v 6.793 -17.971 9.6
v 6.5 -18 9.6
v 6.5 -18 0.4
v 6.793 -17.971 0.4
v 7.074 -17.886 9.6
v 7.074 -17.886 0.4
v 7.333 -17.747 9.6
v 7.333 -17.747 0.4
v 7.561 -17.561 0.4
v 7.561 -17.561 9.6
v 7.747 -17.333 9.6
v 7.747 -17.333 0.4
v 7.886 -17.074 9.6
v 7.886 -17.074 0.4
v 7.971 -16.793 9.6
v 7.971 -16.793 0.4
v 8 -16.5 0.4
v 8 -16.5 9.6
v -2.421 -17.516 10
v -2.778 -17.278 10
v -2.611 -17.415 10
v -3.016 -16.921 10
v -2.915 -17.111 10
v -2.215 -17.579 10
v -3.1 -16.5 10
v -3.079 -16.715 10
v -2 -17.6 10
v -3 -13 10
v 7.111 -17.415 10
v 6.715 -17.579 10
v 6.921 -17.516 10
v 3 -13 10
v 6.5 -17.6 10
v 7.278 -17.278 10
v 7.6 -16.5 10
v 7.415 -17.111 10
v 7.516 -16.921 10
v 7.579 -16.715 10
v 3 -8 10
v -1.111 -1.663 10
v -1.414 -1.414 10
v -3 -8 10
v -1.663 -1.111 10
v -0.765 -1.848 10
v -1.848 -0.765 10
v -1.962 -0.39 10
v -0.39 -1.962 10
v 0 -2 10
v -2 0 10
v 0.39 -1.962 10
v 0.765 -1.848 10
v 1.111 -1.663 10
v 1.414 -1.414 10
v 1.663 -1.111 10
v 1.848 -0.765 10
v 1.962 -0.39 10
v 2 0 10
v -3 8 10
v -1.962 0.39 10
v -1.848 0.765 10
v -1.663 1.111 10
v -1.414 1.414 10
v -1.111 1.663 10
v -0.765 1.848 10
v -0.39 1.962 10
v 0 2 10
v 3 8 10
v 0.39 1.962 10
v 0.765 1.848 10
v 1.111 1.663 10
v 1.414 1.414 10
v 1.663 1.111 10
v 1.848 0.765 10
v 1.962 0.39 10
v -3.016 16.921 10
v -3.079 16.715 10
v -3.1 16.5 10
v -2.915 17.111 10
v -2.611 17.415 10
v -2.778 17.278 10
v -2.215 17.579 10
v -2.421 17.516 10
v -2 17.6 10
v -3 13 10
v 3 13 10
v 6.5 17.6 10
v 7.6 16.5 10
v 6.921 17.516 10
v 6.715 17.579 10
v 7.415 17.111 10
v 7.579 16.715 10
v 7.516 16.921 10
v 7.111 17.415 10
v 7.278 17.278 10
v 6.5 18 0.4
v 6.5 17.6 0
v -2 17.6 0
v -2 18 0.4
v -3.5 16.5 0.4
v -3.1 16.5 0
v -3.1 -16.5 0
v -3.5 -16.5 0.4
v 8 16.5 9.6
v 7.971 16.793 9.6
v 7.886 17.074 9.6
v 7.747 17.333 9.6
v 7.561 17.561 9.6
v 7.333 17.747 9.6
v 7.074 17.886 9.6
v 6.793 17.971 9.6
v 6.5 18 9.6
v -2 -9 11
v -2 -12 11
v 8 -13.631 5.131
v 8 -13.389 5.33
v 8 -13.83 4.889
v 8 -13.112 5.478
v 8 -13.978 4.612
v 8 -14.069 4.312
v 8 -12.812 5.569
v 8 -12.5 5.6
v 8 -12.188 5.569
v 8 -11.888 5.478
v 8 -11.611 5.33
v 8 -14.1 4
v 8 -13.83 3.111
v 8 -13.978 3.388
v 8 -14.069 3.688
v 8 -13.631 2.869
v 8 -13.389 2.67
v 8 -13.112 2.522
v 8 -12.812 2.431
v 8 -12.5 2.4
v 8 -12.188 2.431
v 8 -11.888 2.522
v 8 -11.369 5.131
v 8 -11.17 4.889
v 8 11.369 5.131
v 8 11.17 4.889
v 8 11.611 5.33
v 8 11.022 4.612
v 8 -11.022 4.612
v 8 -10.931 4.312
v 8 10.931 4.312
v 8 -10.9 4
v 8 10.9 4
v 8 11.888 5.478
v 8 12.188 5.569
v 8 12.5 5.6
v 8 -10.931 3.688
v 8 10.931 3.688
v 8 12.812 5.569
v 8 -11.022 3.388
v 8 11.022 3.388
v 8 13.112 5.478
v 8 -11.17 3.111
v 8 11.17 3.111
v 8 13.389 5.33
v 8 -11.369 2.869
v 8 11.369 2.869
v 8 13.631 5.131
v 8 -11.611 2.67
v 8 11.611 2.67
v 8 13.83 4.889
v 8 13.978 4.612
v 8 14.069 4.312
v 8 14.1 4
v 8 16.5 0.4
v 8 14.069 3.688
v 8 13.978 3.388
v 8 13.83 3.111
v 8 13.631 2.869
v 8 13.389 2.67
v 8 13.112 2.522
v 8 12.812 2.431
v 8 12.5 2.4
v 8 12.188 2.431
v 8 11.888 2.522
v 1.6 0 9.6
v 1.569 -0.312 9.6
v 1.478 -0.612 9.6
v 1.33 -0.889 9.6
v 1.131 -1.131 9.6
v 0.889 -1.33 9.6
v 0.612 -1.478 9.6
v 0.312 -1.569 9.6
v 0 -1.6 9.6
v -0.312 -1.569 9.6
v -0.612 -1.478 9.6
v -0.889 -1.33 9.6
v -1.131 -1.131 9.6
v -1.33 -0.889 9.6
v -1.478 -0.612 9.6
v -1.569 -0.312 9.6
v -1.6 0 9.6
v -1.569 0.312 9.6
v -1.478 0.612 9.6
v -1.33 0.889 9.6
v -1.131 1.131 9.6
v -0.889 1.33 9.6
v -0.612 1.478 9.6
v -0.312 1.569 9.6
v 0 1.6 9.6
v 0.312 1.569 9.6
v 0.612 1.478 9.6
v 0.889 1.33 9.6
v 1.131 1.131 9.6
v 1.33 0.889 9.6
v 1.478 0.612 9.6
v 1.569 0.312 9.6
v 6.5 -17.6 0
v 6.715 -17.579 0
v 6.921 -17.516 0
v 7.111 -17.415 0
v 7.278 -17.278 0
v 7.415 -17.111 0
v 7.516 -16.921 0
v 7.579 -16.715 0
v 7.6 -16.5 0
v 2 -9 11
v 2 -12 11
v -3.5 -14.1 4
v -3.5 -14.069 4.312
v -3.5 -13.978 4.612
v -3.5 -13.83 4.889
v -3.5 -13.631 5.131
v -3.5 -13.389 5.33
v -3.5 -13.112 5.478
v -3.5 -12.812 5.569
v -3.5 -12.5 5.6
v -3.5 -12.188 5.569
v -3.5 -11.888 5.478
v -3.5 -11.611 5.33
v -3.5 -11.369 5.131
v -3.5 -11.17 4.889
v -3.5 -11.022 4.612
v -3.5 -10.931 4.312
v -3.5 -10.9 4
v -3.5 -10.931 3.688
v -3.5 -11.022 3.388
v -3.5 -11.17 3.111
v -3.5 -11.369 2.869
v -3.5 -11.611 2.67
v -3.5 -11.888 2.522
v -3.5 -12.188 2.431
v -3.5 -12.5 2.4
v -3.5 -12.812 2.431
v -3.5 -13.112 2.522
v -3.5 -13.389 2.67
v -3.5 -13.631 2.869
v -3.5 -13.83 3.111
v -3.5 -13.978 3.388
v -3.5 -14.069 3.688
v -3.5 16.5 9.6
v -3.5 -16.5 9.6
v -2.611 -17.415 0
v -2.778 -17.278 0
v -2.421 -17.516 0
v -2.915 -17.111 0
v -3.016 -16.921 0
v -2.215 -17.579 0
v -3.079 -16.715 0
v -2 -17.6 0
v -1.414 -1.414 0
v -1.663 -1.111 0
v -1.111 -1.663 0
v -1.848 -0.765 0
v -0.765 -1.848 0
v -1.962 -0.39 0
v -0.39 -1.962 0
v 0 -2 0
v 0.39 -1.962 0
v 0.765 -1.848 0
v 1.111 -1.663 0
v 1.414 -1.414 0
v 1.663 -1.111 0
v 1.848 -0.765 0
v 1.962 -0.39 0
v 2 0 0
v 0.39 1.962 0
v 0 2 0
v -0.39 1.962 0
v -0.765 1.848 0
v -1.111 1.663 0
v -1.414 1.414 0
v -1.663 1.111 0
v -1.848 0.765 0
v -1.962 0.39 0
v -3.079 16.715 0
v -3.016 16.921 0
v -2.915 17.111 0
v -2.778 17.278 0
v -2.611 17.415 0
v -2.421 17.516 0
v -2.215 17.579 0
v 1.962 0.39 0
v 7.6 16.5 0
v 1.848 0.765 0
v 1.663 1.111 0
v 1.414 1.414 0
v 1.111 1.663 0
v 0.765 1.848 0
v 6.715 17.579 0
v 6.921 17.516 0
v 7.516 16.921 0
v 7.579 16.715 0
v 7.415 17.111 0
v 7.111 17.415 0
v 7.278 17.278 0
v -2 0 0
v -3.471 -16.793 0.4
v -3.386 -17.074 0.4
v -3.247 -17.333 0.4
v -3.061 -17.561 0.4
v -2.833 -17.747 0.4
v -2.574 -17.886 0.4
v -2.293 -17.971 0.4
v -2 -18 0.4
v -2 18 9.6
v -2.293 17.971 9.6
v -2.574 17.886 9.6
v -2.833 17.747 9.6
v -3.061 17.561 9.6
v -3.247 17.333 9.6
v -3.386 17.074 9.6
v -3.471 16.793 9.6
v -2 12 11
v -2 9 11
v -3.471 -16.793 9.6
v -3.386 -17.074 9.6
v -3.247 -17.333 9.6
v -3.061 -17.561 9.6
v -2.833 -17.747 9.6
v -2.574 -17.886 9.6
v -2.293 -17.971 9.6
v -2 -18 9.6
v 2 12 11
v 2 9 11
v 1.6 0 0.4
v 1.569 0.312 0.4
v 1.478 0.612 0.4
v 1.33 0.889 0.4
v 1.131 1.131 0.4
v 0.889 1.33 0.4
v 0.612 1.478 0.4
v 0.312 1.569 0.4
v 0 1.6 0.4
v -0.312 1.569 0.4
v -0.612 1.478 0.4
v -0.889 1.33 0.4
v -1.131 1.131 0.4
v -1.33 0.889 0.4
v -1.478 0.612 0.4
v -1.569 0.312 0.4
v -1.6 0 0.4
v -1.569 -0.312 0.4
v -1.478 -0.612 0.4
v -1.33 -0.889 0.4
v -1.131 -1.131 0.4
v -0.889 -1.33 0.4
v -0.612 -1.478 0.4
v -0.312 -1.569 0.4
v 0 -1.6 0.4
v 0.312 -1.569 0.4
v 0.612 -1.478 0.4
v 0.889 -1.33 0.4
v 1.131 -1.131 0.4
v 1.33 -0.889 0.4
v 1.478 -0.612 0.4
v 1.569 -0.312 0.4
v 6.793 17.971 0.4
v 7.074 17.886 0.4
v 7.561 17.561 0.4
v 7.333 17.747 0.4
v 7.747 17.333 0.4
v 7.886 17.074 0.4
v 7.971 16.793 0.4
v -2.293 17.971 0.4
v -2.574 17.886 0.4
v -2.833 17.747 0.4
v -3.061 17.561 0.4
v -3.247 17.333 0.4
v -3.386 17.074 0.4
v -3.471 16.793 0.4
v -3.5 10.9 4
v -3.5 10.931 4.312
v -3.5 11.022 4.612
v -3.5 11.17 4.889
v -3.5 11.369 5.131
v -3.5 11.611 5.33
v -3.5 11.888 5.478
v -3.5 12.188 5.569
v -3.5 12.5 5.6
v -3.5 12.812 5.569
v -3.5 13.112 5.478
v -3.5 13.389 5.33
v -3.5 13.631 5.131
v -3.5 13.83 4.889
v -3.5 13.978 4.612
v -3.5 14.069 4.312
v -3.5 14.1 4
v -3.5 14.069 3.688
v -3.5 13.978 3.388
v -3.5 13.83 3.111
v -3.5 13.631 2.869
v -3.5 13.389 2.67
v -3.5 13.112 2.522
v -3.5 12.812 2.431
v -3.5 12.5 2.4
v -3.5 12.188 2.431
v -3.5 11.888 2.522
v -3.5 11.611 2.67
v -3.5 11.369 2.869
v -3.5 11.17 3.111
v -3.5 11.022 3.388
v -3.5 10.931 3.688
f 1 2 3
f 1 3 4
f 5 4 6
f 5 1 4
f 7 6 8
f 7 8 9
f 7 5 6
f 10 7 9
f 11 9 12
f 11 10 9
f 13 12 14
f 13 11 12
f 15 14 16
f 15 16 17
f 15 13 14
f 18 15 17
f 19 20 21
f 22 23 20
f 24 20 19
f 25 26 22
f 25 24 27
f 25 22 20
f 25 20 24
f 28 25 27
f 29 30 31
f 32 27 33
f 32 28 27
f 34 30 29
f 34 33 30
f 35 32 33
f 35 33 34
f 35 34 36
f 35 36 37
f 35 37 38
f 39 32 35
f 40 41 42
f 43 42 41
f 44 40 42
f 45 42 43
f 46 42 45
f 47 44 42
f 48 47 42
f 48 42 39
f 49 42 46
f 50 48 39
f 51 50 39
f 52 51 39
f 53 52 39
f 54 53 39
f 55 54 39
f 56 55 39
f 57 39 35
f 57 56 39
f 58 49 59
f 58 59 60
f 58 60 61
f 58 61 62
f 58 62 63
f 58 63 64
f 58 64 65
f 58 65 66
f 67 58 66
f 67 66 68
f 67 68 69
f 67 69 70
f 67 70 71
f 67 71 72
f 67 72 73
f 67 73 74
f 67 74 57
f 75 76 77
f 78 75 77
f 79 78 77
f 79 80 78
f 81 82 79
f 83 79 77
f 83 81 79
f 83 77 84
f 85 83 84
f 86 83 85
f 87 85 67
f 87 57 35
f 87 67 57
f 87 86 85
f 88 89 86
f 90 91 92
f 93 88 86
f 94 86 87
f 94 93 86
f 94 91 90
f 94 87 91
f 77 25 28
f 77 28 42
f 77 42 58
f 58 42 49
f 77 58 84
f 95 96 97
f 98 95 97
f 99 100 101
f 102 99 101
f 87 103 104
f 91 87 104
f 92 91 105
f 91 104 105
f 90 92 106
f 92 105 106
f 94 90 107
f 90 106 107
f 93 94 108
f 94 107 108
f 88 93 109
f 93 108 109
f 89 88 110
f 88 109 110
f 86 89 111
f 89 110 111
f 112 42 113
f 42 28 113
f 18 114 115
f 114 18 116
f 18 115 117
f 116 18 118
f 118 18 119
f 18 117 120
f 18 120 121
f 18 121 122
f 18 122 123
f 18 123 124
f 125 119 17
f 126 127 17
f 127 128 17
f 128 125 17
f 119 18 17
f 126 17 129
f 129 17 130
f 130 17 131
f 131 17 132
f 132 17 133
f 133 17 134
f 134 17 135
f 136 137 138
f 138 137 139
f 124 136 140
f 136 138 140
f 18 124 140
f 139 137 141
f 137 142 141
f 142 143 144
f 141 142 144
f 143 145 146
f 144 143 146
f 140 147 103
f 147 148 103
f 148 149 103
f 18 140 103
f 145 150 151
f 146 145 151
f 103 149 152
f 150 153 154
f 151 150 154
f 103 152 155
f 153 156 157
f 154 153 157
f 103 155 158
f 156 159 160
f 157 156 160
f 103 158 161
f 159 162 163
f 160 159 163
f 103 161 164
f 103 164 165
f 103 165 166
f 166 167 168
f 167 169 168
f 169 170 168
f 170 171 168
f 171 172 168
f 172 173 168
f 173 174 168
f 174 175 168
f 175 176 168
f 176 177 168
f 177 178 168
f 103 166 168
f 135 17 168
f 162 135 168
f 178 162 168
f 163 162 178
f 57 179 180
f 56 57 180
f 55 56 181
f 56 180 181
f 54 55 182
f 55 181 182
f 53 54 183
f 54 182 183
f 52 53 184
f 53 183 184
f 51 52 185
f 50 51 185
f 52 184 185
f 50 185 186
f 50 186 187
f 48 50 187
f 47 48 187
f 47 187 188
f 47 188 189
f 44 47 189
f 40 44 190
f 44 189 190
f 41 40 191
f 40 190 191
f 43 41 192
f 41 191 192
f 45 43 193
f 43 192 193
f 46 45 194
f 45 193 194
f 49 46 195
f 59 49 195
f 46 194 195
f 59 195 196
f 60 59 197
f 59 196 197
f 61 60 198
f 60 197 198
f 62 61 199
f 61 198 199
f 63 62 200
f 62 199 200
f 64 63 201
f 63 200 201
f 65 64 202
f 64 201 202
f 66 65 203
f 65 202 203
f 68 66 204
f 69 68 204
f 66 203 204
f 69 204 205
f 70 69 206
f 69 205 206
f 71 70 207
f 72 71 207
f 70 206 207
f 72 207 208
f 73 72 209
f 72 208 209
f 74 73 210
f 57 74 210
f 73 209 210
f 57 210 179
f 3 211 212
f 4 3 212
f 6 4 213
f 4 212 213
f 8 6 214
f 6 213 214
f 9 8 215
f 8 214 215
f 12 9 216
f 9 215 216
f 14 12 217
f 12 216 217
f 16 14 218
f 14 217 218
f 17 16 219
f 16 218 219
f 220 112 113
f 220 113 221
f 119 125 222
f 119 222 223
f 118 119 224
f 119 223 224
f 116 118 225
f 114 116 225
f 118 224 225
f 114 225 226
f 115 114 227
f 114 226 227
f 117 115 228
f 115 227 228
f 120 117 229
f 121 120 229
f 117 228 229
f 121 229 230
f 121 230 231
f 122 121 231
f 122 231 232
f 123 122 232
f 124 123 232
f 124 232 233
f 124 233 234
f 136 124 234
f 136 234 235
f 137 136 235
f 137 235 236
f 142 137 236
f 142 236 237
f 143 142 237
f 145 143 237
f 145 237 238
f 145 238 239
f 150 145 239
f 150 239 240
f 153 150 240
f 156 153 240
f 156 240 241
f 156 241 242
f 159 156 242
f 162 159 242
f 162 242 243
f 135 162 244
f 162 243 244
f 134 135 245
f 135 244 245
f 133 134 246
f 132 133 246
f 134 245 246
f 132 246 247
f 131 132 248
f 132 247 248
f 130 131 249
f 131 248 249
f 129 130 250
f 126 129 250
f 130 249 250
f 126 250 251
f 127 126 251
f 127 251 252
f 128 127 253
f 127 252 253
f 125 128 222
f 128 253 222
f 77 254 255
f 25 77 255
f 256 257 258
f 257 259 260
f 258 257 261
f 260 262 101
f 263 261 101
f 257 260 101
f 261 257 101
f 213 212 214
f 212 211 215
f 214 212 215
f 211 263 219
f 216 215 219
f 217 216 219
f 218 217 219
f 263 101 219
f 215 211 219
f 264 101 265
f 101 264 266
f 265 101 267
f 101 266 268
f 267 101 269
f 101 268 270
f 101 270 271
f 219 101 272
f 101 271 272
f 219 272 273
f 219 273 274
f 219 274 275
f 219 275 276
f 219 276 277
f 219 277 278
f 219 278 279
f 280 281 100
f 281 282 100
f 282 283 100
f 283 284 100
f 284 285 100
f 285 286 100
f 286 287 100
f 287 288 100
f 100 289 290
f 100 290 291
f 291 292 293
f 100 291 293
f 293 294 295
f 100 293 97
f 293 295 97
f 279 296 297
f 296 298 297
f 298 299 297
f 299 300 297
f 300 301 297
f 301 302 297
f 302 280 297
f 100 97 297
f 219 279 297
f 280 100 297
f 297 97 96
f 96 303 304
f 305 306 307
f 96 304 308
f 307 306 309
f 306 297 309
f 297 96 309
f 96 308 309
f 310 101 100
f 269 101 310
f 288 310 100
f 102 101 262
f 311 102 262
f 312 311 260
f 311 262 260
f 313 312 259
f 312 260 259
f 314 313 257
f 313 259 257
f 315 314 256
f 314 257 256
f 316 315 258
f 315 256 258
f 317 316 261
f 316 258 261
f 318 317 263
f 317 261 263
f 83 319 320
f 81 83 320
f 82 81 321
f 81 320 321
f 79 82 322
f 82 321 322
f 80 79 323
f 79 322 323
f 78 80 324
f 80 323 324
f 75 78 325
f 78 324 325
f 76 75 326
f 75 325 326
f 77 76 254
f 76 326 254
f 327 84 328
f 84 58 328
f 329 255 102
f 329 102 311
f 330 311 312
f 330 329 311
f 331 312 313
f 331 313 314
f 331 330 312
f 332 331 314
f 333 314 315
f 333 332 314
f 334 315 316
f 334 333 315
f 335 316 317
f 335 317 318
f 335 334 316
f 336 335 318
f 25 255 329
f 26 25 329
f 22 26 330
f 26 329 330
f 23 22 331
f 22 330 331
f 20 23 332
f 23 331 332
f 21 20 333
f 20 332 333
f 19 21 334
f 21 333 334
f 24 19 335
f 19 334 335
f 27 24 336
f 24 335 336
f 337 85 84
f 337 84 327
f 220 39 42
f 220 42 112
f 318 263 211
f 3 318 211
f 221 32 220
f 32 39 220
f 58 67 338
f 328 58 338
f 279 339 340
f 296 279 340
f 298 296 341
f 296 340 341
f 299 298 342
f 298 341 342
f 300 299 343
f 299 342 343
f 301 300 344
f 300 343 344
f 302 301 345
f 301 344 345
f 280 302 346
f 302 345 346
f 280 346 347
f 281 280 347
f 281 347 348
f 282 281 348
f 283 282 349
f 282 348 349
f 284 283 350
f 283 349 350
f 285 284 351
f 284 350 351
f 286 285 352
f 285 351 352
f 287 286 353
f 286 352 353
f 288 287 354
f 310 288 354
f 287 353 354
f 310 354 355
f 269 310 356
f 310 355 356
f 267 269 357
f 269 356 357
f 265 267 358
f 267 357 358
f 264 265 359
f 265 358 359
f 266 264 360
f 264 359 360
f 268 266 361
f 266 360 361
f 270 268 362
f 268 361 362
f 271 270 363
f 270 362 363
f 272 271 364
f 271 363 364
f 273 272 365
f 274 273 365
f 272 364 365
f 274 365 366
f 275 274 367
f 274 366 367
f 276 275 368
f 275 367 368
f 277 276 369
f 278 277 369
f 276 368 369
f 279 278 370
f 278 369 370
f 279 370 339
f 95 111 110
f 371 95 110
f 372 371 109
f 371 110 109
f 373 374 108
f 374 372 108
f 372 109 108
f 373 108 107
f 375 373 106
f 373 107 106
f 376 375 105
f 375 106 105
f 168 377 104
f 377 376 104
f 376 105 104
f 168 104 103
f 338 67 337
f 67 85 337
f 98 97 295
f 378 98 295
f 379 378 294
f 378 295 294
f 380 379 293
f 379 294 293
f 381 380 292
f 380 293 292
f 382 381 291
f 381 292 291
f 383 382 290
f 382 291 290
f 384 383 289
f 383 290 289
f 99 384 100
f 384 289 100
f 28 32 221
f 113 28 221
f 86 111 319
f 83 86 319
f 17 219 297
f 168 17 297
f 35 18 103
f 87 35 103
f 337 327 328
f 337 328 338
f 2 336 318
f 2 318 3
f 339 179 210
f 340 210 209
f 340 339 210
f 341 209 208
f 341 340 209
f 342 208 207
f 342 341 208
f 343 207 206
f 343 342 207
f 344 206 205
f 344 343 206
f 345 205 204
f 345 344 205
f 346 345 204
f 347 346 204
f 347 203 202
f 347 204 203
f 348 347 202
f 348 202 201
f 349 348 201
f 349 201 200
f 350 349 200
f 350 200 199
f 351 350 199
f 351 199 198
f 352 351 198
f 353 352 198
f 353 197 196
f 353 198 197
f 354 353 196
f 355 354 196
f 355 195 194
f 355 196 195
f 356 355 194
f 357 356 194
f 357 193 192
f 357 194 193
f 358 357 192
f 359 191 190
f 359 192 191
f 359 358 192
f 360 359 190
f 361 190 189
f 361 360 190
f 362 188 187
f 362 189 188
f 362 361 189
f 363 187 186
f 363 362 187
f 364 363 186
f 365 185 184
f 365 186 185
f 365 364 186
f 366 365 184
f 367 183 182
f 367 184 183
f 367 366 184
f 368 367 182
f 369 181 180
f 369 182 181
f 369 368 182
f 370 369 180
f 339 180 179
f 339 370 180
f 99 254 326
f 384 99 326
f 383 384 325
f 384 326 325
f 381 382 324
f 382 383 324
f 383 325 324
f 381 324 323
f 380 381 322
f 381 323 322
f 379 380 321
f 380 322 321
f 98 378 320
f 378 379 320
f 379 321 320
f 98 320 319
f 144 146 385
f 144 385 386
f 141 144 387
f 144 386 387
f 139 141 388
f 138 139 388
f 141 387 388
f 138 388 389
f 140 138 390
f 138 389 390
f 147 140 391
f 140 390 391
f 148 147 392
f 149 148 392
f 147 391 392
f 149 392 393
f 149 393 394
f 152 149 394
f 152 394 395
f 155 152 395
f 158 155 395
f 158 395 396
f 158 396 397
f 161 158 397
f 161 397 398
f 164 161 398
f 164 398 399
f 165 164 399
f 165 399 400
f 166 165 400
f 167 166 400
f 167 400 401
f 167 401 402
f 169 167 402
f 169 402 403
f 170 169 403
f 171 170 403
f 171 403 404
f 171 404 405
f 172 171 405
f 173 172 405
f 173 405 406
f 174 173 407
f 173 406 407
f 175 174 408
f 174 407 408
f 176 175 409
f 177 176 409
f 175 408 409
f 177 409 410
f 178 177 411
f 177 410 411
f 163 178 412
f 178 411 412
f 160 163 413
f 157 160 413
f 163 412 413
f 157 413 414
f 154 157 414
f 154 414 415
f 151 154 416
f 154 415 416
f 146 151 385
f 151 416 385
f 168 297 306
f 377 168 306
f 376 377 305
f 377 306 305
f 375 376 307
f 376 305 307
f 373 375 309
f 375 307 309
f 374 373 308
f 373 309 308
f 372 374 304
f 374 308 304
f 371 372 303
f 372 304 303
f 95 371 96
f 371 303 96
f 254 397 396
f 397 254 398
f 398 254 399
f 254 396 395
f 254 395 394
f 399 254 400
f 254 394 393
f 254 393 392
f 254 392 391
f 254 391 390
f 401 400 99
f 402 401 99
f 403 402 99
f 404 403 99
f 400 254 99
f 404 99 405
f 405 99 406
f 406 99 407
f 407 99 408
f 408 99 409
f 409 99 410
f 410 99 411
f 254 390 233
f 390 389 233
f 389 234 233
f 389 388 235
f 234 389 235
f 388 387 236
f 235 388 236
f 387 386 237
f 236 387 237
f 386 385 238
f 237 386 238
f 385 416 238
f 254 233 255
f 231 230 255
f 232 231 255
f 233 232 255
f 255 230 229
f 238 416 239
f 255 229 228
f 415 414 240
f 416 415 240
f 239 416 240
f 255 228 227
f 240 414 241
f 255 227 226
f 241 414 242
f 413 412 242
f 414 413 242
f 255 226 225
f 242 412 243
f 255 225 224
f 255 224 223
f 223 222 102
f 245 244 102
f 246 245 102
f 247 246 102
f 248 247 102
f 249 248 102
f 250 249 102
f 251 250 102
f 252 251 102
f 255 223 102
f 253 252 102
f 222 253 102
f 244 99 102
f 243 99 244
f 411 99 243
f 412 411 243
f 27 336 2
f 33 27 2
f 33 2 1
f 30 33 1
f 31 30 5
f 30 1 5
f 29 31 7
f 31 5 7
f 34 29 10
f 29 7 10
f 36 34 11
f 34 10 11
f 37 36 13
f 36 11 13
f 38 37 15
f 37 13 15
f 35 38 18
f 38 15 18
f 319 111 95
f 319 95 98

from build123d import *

# Parameters (mm, degrees)
PAD_DEPTH            = 10
SKETCH003_R          = 1.6
POCKET_DEPTH         = 0.001
POCKET_DEPTH_BACK    = 10.001
SKETCH006_W          = 6
SKETCH006_H          = 5
PAD001_DEPTH         = 1
PAD001_TAPER         = 45
SKETCH_R             = 1.6
POCKET004_DEPTH      = 11.501
POCKET004_DEPTH_BACK = 0.001
FILLET_R             = 1.5
CHAMFER_SIZE         = 0.4


with BuildPart() as part:
    # Sketch001 → Pad (new body)
    with BuildSketch(Plane.XY):
        Polygon((-3.5, 18), (-3.5, 0), (-3.5, -18), (8, -18), (8, 18), align=None)
    extrude(amount=PAD_DEPTH)

    # Sketch003 → Pocket (cut, two sides)
    with BuildSketch(Plane.XY) as pocket_sk:
        Circle(SKETCH003_R)
    extrude(amount=-POCKET_DEPTH, mode=Mode.SUBTRACT)
    extrude(pocket_sk.sketch, amount=POCKET_DEPTH_BACK, mode=Mode.SUBTRACT)

    # Sketch006 (on Face5 of Pocket) → Pad001 (join)
    with BuildSketch(Plane.XY.offset(10)):
        with Locations((0, 10.5)):
            Rectangle(SKETCH006_W, SKETCH006_H)
        with Locations((0, -10.5)):
            Rectangle(SKETCH006_W, SKETCH006_H)
    extrude(amount=PAD001_DEPTH, taper=PAD001_TAPER)

    # Sketch (on Face2 of Pad001) → Pocket004 (cut, two sides)
    with BuildSketch(Plane(origin=(-3.5, 0, 0), x_dir=(0, -1, 0), z_dir=(-1, 0, 0))) as pocket004_sk:
        with Locations((-12.5, 4)):
            Circle(SKETCH_R)
        with Locations((12.5, 4)):
            Circle(SKETCH_R)
    extrude(amount=-POCKET004_DEPTH, mode=Mode.SUBTRACT)
    extrude(pocket004_sk.sketch, amount=POCKET004_DEPTH_BACK, mode=Mode.SUBTRACT)

    # Fillet
    fillet_edges = [part.edges().sort_by_distance(p)[0] for p in [
        (-3.5, -18, 5),
        (8, -18, 5),
        (-3.5, 18, 5),
        (8, 18, 5),
    ]]
    fillet(fillet_edges, radius=FILLET_R)

    # Chamfer
    chamfer_edges = [part.edges().sort_by_distance(p)[0] for p in [
        (-3.5, 0, 0),
        (-3.06066, 17.56066, 0),
        (-3.06066, -17.56066, 0),
        (2.25, 18, 0),
        (2.25, -18, 0),
        (7.56066, 17.56066, 0),
        (7.56066, -17.56066, 0),
        (8, 0, 0),
        (-1.6, 0, 0),
        (2.25, 18, 10),
        (-1.6, 0, 10),
    ]]
    chamfer(chamfer_edges, length=CHAMFER_SIZE)


solid = part.part
